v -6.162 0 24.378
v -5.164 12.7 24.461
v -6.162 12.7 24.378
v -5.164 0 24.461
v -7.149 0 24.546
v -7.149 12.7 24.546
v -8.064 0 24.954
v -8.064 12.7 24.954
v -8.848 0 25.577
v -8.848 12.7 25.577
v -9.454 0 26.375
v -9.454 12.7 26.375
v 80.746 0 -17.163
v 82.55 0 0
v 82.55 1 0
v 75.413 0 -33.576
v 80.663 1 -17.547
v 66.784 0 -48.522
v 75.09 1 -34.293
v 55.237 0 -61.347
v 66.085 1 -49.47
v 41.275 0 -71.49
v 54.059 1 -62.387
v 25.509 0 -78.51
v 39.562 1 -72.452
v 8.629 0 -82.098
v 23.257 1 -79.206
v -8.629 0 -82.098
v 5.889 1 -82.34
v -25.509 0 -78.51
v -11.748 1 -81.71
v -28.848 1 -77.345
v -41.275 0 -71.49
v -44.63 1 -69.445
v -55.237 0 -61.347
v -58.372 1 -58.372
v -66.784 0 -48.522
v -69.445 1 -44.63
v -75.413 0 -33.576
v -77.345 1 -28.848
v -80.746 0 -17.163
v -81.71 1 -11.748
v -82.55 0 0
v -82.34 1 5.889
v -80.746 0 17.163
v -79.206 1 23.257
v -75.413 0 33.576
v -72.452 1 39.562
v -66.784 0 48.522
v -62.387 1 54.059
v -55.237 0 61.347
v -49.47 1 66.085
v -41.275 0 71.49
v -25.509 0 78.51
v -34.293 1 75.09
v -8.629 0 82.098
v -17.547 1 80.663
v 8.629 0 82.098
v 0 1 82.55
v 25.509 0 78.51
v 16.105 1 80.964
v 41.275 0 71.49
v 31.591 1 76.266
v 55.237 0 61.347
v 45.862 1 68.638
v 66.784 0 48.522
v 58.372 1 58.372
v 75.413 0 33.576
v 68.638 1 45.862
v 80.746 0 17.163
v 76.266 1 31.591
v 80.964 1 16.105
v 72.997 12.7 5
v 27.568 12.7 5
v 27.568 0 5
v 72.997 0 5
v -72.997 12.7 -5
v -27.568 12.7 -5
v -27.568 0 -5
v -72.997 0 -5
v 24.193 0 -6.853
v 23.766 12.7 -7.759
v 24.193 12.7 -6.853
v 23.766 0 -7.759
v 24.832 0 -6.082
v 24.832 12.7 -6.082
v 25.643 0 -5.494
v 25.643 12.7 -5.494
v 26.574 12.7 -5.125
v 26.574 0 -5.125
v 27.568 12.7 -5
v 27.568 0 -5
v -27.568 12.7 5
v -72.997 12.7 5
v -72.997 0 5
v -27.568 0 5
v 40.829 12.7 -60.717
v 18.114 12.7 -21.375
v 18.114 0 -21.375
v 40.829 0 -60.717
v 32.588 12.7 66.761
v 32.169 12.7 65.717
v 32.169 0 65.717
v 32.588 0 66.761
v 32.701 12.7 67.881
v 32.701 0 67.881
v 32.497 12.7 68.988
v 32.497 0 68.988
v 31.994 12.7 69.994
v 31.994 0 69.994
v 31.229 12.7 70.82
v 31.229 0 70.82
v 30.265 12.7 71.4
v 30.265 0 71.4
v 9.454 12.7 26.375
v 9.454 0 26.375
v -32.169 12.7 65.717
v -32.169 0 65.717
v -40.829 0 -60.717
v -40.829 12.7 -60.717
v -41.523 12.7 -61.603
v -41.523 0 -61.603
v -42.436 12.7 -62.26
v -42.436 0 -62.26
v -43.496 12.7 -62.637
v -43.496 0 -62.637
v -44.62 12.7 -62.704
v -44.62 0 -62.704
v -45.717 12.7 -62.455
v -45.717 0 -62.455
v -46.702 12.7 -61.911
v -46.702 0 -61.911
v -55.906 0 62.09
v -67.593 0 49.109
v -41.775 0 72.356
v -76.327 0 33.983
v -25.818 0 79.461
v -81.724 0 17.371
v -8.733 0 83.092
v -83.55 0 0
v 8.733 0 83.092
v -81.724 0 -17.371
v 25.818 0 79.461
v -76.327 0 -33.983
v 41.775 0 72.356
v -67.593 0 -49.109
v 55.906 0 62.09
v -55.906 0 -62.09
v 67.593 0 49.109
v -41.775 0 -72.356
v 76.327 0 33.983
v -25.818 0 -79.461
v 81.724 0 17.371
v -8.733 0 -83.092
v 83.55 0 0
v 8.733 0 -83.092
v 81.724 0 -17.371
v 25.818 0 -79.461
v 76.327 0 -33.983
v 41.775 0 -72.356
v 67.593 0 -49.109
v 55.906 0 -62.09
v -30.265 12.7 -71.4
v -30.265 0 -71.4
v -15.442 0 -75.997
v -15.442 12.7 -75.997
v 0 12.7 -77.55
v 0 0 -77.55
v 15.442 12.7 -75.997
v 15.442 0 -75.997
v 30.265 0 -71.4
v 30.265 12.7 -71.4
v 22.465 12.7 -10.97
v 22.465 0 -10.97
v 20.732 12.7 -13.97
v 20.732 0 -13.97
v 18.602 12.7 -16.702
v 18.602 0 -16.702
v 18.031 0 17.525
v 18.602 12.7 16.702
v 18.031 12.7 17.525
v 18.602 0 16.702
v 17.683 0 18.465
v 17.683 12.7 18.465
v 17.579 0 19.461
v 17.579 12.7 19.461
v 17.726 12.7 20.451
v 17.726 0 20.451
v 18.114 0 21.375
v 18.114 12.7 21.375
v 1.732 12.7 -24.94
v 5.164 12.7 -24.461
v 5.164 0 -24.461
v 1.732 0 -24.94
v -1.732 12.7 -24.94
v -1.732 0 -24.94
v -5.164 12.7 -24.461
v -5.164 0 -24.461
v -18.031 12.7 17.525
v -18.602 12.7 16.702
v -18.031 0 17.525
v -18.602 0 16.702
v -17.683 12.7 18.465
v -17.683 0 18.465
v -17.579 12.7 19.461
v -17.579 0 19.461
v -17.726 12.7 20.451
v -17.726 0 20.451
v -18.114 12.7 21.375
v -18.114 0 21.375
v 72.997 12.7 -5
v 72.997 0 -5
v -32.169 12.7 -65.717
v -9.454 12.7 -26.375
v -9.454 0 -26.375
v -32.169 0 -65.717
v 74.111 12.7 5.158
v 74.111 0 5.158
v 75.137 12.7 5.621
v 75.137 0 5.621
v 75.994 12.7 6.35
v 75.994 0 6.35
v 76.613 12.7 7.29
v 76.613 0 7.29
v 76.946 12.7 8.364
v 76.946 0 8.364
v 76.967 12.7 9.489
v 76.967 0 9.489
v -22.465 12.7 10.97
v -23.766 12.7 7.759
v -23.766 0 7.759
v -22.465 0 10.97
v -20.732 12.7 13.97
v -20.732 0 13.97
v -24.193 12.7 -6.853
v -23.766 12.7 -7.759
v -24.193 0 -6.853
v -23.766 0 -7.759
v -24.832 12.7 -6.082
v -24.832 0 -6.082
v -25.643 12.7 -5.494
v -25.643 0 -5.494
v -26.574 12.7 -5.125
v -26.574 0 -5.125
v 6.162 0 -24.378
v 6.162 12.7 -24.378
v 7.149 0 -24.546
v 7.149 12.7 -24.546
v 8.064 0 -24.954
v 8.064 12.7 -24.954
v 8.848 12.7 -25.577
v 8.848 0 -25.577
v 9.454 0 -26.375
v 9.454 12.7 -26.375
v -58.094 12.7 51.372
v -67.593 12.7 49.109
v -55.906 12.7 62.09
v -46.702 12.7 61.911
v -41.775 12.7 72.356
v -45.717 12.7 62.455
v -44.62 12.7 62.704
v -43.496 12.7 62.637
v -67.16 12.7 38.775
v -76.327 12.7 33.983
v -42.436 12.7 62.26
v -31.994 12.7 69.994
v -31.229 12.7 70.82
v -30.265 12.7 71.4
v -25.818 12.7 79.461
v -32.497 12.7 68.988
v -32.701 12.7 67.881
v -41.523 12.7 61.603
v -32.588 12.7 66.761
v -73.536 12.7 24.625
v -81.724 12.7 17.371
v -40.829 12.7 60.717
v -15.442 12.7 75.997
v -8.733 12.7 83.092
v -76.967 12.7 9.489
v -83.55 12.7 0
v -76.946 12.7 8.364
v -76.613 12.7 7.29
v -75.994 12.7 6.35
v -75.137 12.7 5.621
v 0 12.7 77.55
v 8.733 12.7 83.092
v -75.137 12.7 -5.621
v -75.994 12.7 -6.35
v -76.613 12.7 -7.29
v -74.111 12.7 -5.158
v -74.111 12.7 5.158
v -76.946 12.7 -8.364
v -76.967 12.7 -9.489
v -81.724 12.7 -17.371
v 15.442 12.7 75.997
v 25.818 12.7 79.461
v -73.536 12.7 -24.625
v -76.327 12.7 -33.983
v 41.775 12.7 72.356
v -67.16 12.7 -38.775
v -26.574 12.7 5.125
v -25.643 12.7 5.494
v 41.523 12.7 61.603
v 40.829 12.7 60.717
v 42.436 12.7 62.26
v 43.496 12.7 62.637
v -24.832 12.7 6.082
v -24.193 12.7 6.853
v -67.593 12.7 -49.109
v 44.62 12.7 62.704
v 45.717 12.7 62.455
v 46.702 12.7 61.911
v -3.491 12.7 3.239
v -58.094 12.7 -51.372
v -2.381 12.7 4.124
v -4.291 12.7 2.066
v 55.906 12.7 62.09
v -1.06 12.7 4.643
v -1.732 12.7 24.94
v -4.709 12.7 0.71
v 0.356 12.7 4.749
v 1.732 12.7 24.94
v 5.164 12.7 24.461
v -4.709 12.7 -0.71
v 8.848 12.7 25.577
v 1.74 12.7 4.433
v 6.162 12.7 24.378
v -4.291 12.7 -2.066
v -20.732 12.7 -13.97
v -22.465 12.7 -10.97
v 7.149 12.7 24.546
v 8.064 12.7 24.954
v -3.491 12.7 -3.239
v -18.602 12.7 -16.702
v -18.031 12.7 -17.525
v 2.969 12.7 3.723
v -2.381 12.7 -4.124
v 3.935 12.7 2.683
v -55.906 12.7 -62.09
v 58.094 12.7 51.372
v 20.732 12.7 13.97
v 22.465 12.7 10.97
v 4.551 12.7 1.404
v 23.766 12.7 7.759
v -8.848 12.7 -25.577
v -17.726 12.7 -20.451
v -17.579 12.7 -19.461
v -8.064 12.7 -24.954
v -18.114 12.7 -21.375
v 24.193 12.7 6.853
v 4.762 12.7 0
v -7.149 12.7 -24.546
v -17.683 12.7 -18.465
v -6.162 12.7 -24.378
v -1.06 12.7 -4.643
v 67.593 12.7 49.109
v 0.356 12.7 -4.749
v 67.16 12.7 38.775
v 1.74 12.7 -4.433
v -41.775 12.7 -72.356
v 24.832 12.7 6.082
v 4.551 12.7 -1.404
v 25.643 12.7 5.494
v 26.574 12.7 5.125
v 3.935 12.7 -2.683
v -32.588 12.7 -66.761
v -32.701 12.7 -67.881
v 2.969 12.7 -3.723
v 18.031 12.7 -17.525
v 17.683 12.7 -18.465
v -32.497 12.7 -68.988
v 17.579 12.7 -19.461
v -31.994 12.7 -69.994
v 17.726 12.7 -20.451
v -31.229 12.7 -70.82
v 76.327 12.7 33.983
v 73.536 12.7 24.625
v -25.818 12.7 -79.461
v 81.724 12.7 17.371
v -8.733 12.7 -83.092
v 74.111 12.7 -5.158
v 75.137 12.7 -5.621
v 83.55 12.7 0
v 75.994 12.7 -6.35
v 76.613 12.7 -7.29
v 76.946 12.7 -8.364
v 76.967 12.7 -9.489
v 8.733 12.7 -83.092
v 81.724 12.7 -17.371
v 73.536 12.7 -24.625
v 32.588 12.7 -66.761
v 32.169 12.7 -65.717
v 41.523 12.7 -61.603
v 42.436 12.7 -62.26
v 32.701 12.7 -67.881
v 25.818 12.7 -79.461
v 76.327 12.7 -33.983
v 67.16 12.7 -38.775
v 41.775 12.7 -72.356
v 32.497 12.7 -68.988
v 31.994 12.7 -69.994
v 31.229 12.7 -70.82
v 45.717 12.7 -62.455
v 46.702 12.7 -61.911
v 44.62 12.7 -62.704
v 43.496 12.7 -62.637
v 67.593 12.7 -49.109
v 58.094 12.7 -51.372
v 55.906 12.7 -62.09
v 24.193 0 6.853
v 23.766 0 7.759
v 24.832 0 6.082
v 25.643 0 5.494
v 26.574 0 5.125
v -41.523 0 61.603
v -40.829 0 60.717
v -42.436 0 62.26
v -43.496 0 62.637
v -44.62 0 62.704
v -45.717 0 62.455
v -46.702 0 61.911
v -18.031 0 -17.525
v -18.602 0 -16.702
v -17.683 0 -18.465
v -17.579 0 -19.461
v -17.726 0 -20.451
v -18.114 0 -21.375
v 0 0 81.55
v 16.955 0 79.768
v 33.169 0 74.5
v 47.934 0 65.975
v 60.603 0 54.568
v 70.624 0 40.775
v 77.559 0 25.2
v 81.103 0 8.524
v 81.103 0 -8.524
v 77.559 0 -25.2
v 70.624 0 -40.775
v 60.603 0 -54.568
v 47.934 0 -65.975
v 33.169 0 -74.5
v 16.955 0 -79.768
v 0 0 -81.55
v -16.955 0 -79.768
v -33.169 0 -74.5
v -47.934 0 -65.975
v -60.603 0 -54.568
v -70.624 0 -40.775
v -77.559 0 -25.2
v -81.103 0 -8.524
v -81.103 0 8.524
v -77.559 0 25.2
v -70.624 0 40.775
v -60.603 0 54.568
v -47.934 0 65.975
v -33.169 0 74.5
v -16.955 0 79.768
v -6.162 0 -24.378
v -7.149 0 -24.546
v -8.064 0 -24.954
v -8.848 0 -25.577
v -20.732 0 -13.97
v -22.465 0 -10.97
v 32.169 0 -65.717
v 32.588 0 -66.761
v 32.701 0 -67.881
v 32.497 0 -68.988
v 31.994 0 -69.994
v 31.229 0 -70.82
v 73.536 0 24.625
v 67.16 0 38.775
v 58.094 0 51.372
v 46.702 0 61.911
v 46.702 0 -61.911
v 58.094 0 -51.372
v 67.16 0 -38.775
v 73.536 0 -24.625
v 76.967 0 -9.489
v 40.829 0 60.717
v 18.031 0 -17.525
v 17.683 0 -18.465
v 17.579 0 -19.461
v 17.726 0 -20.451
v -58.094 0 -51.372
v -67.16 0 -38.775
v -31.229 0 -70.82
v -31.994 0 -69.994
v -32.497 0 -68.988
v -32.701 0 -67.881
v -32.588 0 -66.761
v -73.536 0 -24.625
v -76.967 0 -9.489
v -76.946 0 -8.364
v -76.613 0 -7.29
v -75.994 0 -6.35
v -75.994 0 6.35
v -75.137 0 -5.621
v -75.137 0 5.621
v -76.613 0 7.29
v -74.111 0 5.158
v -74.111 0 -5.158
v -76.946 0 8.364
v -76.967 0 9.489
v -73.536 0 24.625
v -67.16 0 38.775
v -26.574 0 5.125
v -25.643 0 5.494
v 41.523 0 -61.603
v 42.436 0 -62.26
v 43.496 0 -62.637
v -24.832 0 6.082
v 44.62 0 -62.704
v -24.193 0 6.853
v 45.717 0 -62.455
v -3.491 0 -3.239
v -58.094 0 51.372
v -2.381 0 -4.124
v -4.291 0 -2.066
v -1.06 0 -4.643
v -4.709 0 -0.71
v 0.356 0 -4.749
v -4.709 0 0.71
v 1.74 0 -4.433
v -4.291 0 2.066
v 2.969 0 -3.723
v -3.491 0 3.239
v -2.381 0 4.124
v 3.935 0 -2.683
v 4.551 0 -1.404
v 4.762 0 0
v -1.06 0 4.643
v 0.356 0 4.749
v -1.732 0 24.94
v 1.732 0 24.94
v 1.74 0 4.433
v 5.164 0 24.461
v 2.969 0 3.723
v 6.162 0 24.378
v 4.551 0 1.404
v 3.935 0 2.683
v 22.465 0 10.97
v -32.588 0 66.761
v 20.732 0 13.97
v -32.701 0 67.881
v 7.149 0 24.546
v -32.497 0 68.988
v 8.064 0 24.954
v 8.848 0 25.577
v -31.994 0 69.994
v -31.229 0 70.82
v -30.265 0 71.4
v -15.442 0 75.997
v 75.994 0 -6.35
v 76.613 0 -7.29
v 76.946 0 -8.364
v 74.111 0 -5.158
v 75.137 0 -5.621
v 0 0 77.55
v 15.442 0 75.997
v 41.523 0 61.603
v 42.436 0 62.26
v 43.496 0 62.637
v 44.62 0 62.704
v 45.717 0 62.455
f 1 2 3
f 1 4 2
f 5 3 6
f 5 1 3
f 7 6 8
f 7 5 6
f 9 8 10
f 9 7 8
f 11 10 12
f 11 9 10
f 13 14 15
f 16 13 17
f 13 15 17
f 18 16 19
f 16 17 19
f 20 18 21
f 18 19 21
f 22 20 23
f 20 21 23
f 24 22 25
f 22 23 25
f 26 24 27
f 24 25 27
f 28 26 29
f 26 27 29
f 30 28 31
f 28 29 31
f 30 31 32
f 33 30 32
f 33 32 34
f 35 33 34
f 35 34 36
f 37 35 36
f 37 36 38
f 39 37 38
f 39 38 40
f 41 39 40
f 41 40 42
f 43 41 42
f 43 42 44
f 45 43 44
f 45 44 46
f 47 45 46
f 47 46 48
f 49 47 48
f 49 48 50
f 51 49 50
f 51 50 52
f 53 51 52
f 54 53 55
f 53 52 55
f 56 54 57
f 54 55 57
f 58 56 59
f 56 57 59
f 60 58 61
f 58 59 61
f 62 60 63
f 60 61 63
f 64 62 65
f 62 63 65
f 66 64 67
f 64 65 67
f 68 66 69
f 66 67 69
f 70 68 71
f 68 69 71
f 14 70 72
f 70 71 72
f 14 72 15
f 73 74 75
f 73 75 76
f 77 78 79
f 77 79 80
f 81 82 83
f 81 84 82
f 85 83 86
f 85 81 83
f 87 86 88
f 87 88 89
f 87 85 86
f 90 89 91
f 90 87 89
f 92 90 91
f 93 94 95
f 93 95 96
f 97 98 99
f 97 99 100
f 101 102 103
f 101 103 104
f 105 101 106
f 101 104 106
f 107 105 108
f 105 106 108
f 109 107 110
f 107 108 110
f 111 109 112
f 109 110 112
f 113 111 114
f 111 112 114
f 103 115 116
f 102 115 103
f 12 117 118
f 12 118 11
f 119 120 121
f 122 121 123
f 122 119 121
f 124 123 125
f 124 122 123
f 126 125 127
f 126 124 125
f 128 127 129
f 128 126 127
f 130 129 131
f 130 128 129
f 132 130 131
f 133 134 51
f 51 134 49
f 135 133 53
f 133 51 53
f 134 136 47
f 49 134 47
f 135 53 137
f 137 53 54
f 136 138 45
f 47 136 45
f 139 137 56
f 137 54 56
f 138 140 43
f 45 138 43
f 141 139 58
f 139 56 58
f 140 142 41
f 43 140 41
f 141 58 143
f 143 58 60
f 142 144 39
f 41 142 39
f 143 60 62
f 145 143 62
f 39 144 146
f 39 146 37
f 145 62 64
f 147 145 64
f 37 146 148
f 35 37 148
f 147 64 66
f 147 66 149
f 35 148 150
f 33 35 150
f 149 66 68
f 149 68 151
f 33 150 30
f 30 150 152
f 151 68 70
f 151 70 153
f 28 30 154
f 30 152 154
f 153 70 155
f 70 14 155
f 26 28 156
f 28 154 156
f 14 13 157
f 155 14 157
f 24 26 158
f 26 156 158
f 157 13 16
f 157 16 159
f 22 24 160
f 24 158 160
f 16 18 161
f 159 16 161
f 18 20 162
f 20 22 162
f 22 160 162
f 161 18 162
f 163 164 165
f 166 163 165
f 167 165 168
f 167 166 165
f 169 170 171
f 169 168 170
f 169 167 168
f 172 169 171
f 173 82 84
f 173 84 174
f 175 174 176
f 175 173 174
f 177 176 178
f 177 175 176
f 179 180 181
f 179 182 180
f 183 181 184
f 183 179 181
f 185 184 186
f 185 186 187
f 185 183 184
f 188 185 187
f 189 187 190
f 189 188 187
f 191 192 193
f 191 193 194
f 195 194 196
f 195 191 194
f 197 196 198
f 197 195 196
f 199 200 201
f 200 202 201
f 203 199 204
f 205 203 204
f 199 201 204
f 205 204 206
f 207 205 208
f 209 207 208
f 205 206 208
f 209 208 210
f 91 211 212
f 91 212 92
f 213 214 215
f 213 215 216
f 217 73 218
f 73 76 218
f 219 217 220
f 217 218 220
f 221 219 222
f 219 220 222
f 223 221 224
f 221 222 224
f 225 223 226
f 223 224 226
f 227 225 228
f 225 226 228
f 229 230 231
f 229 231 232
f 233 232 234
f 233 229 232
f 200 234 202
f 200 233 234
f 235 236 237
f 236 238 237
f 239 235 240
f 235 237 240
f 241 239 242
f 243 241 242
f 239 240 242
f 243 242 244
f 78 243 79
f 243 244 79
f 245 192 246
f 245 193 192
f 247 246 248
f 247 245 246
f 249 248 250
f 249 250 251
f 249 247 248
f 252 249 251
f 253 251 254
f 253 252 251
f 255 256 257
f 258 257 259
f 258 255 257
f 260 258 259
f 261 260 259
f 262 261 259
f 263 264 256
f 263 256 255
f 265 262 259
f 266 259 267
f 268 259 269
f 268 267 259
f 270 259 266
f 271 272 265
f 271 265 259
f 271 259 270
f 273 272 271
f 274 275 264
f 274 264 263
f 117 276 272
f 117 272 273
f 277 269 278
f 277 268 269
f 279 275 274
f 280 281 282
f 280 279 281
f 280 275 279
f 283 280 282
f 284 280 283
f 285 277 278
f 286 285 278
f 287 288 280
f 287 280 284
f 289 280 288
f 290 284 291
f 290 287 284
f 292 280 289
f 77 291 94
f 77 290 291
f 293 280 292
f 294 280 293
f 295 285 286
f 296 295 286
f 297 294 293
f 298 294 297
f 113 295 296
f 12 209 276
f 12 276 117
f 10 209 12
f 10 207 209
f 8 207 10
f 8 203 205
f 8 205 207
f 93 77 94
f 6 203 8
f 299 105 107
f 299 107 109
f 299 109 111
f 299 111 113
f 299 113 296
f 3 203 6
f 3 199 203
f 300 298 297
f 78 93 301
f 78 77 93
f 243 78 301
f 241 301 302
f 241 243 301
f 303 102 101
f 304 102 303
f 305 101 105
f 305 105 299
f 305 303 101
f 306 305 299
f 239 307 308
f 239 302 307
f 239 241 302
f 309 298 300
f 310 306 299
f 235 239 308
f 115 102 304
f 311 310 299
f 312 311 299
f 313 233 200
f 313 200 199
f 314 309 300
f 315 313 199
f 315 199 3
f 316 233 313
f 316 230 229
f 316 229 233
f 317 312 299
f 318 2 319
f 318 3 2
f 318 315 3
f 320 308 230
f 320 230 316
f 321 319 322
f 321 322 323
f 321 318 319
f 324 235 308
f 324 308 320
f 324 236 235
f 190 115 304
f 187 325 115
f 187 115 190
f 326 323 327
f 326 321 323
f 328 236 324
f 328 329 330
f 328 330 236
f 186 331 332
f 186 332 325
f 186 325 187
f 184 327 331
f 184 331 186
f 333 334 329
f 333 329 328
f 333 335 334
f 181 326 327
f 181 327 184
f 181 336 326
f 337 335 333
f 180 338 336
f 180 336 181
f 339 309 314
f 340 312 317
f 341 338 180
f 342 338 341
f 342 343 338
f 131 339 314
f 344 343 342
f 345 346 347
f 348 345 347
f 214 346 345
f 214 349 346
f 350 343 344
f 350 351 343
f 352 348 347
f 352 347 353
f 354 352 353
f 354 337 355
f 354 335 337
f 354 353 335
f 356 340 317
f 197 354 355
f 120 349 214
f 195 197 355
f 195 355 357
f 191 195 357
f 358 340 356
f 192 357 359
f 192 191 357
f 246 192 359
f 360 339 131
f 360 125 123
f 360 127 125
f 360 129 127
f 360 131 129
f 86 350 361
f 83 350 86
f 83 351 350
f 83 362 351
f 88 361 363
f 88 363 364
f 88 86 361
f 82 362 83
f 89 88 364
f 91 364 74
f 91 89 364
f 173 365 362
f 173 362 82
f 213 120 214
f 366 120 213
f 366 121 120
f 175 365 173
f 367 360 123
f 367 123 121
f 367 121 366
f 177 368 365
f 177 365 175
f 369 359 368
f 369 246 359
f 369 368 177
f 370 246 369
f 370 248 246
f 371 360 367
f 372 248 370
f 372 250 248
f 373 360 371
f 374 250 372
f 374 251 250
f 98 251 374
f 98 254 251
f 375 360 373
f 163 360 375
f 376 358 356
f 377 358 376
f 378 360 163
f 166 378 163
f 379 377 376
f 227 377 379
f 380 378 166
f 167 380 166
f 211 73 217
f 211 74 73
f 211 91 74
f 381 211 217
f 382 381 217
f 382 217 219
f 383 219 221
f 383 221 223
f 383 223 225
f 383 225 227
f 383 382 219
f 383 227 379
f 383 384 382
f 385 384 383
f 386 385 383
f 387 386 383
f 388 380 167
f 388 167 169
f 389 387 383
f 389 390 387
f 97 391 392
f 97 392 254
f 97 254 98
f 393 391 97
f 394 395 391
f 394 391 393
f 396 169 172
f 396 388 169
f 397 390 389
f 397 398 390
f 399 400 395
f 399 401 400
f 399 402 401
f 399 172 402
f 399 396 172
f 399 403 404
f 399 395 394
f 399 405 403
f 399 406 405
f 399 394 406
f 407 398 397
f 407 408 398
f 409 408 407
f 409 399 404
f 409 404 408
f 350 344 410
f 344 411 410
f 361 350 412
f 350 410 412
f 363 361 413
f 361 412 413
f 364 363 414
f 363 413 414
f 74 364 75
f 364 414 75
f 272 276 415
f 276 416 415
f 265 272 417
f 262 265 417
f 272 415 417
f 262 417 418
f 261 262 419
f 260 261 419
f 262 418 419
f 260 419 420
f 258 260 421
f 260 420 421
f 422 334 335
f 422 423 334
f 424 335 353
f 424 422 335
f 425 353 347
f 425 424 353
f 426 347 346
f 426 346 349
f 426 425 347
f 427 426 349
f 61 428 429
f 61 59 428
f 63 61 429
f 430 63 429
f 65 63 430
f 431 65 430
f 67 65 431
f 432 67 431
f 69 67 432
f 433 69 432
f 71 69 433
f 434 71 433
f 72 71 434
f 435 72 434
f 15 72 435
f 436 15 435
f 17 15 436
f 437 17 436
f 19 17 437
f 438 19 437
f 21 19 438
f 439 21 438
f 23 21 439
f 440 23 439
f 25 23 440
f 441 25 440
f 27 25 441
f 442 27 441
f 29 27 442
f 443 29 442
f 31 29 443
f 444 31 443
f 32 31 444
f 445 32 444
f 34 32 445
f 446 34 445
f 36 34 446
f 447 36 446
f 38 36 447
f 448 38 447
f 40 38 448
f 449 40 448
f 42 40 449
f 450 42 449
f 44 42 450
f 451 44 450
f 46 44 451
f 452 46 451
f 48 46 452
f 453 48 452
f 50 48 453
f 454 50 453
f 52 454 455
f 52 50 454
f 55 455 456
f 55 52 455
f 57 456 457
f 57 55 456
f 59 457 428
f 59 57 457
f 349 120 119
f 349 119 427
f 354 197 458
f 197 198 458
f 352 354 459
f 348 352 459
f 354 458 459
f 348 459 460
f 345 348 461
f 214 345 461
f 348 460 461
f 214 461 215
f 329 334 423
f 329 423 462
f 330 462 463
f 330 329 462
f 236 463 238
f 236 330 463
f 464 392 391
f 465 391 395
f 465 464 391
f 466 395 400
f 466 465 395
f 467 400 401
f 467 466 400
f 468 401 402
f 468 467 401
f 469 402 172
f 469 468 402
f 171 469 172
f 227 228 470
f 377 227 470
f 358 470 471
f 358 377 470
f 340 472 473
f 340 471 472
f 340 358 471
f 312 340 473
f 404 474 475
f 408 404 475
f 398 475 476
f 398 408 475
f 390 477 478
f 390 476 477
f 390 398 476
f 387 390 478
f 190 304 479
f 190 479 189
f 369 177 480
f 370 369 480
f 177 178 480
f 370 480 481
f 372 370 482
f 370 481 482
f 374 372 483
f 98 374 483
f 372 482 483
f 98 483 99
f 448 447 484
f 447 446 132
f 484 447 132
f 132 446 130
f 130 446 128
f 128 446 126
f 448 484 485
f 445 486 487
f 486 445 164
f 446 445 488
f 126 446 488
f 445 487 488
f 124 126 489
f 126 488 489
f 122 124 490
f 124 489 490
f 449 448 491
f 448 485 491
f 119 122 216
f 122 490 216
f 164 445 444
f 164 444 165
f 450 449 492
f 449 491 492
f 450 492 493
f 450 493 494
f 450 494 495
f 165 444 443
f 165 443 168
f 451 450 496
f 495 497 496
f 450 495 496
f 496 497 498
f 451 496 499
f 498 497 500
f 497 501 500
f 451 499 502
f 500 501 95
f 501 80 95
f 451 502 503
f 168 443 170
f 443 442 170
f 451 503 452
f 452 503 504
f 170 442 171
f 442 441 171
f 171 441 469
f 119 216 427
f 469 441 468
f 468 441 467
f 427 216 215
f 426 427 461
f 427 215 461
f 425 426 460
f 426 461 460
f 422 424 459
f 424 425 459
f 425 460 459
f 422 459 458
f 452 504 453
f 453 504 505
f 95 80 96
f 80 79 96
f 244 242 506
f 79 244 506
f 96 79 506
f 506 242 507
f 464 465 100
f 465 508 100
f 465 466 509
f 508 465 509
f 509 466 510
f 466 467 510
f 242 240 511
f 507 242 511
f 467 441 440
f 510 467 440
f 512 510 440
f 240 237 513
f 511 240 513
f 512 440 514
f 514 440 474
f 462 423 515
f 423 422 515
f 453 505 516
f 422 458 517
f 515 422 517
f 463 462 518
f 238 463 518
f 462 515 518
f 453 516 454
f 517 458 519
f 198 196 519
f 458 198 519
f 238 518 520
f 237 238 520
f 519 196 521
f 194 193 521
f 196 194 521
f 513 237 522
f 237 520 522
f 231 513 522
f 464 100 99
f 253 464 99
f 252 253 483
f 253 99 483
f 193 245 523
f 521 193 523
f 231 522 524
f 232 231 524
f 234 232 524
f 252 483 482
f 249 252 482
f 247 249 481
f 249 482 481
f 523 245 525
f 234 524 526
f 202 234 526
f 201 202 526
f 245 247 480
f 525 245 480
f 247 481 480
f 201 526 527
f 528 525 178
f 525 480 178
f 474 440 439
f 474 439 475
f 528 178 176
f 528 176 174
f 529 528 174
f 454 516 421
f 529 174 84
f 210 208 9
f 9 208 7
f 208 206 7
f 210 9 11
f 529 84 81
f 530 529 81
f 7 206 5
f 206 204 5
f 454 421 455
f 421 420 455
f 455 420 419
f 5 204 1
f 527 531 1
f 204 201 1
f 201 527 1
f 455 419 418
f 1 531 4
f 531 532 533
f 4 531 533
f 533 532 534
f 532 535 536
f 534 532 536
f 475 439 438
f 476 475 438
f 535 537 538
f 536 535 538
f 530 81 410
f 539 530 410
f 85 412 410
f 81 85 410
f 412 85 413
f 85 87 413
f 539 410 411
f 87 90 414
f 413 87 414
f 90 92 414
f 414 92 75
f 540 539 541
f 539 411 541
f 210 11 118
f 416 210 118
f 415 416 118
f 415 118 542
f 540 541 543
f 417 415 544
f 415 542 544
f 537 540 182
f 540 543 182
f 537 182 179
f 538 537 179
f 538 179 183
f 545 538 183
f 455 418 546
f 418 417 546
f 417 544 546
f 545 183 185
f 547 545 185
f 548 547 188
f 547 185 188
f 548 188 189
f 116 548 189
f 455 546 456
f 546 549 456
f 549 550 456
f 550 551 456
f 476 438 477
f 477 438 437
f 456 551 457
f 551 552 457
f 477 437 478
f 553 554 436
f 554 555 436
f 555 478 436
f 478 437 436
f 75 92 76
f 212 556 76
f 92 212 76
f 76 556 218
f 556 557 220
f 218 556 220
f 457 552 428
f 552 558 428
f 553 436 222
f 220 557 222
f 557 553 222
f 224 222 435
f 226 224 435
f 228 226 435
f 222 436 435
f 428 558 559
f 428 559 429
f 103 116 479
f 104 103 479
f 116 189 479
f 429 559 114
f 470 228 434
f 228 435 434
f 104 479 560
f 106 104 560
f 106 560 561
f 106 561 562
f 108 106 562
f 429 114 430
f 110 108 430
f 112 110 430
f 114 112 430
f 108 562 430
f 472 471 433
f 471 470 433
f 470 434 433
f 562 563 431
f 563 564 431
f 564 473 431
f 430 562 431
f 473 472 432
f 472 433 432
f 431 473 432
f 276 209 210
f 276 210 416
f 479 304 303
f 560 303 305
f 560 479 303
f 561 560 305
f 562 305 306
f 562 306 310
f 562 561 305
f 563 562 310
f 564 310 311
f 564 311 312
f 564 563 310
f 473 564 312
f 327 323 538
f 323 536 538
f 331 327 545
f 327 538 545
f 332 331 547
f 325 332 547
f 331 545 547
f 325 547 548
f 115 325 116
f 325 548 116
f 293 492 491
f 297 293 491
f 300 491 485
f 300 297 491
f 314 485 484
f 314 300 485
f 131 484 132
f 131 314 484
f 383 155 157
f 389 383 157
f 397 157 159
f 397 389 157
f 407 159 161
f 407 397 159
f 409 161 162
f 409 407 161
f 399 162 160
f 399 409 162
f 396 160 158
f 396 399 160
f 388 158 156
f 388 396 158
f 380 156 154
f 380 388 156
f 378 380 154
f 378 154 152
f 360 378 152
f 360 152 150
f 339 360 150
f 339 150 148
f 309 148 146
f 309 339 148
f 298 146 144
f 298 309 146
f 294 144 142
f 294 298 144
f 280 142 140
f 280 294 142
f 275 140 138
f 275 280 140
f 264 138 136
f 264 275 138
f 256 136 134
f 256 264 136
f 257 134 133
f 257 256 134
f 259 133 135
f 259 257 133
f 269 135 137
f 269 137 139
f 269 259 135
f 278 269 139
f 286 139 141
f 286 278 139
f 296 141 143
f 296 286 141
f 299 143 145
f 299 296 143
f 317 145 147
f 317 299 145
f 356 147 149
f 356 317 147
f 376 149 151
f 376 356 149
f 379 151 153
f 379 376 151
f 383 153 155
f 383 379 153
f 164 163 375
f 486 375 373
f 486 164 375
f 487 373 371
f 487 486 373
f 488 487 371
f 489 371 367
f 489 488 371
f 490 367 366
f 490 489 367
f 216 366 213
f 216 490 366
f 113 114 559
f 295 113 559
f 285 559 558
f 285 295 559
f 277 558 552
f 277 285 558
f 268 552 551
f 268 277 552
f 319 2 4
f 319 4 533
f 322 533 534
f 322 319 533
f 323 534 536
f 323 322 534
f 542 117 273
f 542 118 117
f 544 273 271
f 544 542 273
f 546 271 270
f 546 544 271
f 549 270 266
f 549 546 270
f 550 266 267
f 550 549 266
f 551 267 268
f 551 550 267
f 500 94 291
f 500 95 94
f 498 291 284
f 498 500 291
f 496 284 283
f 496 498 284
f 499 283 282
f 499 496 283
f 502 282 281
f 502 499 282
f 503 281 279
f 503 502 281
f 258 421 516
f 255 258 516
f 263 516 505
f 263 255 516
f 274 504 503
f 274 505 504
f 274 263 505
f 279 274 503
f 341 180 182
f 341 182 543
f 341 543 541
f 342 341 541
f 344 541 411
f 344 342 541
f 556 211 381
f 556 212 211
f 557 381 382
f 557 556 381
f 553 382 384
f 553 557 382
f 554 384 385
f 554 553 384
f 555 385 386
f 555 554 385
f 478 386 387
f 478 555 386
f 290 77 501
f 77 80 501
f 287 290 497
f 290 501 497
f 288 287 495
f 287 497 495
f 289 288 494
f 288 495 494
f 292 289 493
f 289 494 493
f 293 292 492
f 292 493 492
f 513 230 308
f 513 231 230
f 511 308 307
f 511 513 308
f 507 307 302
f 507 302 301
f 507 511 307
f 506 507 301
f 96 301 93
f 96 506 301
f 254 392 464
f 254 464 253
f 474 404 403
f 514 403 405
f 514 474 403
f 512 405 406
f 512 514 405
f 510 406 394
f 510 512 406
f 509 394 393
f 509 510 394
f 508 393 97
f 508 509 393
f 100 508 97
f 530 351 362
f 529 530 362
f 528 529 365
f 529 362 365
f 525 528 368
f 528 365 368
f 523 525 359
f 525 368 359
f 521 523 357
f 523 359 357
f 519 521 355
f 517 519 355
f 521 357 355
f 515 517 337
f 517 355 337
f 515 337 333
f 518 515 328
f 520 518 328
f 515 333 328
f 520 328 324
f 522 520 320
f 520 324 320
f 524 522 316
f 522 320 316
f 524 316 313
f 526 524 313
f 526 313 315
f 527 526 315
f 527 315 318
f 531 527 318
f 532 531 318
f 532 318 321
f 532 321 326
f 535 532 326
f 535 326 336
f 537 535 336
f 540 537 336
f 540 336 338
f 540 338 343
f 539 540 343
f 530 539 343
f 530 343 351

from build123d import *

# Parameters (mm, degrees)
SKETCH2_W                    = 82.55
SKETCH2_H                    = 12.7
CUT_EXTRUDE1_DEPTH           = 13.7
FILLET1_R                    = 4
CIRPATTERN4_COUNT            = 6
FILLET1_OF_CIRPATTERN4_R     = 4
CHAMFER2_SIZE                = 1
F_3_8_0_375_DIAMETER_HOLE1_D = 9.525
SKETCH12_R                   = 83.55
SKETCH12_R_2                 = 82.55
BOSS_EXTRUDE1_DEPTH          = 12.7


with BuildPart() as part:
    # Sketch2 → Revolve1 (revolve)
    with BuildSketch(Plane(origin=(0, 0, 0), x_dir=(0, 0, -1), z_dir=(1, 0, 0))):
        with Locations((-41.275, 6.35)):
            Rectangle(SKETCH2_W, SKETCH2_H)
    revolve(axis=Axis((0, -0.75, 0), (0, 1, 0)))

    # Sketch8 → Cut-Extrude1 (cut, through all)
    with BuildSketch(Plane(origin=(0, 12.7, 0), x_dir=(1, 0, 0), z_dir=(0, 1, 0))):
        with BuildLine():
            Line((-7.917322, 23.713203), (-34.364196, 69.520533))
            ThreePointArc((-34.364196, 69.520533), (0, 77.55), (34.364196, 69.520533))
            Line((34.364196, 69.520533), (7.917322, 23.713203))
            ThreePointArc((7.917322, 23.713203), (0, 25), (-7.917322, 23.713203))
        make_face()
    cut_extrude1 = extrude(amount=-CUT_EXTRUDE1_DEPTH, mode=Mode.SUBTRACT)

    # Fillet1
    fillet1_edges = [part.edges().sort_by_distance(p)[0] for p in [
        (7.917322, 6.35, -23.713203),
        (-7.917322, 6.35, -23.713203),
        (-34.364196, 6.35, -69.520533),
        (34.364196, 6.35, -69.520533),
    ]]
    fillet(fillet1_edges, radius=FILLET1_R)

    # CirPattern4: Cut-Extrude1 ×6 about axis
    cirpattern4_axis = Axis((0, 0, 0), (0, 1, 0))
    for i in range(1, CIRPATTERN4_COUNT):
        add(cut_extrude1.rotate(cirpattern4_axis, i * 360 / CIRPATTERN4_COUNT), mode=Mode.SUBTRACT)

    # Fillet1 of CirPattern4
    fillet1_of_cirpattern4_edges = [part.edges().sort_by_distance(p)[0] for p in [
        (-16.577576, 6.35, -18.713203),
        (-24.494897, 6.35, -5),
        (-77.388646, 6.35, -5),
        (-43.02445, 6.35, -64.520533),
        (-24.494897, 6.35, 5),
        (-16.577576, 6.35, 18.713203),
        (-43.02445, 6.35, 64.520533),
        (-77.388646, 6.35, 5),
        (-7.917322, 6.35, 23.713203),
        (7.917322, 6.35, 23.713203),
        (34.364196, 6.35, 69.520533),
        (-34.364196, 6.35, 69.520533),
        (16.577576, 6.35, 18.713203),
        (24.494897, 6.35, 5),
        (77.388646, 6.35, 5),
        (43.02445, 6.35, 64.520533),
        (24.494897, 6.35, -5),
        (16.577576, 6.35, -18.713203),
        (43.02445, 6.35, -64.520533),
        (77.388646, 6.35, -5),
    ]]
    fillet(fillet1_of_cirpattern4_edges, radius=FILLET1_OF_CIRPATTERN4_R)

    # Chamfer2
    chamfer2_edges = [part.edges().sort_by_distance(p)[0] for p in [
        (0, 0, -82.55),
    ]]
    chamfer(chamfer2_edges, length=CHAMFER2_SIZE)

    # 3/8 (0.375) Diameter Hole1 (through all)
    with Locations(Plane(origin=(0, 0, 0), x_dir=(-1, 0, 0), z_dir=(0, -1, 0))):
        with Locations((0, 0)):
            Hole(F_3_8_0_375_DIAMETER_HOLE1_D / 2)

    # Sketch12 → Boss-Extrude1 (add)
    with BuildSketch(Plane(origin=(0, 12.7, 0), x_dir=(1, 0, 0), z_dir=(0, 1, 0))):
        Circle(SKETCH12_R)
        Circle(SKETCH12_R_2, mode=Mode.SUBTRACT)
    extrude(amount=-BOSS_EXTRUDE1_DEPTH)


solid = part.part
